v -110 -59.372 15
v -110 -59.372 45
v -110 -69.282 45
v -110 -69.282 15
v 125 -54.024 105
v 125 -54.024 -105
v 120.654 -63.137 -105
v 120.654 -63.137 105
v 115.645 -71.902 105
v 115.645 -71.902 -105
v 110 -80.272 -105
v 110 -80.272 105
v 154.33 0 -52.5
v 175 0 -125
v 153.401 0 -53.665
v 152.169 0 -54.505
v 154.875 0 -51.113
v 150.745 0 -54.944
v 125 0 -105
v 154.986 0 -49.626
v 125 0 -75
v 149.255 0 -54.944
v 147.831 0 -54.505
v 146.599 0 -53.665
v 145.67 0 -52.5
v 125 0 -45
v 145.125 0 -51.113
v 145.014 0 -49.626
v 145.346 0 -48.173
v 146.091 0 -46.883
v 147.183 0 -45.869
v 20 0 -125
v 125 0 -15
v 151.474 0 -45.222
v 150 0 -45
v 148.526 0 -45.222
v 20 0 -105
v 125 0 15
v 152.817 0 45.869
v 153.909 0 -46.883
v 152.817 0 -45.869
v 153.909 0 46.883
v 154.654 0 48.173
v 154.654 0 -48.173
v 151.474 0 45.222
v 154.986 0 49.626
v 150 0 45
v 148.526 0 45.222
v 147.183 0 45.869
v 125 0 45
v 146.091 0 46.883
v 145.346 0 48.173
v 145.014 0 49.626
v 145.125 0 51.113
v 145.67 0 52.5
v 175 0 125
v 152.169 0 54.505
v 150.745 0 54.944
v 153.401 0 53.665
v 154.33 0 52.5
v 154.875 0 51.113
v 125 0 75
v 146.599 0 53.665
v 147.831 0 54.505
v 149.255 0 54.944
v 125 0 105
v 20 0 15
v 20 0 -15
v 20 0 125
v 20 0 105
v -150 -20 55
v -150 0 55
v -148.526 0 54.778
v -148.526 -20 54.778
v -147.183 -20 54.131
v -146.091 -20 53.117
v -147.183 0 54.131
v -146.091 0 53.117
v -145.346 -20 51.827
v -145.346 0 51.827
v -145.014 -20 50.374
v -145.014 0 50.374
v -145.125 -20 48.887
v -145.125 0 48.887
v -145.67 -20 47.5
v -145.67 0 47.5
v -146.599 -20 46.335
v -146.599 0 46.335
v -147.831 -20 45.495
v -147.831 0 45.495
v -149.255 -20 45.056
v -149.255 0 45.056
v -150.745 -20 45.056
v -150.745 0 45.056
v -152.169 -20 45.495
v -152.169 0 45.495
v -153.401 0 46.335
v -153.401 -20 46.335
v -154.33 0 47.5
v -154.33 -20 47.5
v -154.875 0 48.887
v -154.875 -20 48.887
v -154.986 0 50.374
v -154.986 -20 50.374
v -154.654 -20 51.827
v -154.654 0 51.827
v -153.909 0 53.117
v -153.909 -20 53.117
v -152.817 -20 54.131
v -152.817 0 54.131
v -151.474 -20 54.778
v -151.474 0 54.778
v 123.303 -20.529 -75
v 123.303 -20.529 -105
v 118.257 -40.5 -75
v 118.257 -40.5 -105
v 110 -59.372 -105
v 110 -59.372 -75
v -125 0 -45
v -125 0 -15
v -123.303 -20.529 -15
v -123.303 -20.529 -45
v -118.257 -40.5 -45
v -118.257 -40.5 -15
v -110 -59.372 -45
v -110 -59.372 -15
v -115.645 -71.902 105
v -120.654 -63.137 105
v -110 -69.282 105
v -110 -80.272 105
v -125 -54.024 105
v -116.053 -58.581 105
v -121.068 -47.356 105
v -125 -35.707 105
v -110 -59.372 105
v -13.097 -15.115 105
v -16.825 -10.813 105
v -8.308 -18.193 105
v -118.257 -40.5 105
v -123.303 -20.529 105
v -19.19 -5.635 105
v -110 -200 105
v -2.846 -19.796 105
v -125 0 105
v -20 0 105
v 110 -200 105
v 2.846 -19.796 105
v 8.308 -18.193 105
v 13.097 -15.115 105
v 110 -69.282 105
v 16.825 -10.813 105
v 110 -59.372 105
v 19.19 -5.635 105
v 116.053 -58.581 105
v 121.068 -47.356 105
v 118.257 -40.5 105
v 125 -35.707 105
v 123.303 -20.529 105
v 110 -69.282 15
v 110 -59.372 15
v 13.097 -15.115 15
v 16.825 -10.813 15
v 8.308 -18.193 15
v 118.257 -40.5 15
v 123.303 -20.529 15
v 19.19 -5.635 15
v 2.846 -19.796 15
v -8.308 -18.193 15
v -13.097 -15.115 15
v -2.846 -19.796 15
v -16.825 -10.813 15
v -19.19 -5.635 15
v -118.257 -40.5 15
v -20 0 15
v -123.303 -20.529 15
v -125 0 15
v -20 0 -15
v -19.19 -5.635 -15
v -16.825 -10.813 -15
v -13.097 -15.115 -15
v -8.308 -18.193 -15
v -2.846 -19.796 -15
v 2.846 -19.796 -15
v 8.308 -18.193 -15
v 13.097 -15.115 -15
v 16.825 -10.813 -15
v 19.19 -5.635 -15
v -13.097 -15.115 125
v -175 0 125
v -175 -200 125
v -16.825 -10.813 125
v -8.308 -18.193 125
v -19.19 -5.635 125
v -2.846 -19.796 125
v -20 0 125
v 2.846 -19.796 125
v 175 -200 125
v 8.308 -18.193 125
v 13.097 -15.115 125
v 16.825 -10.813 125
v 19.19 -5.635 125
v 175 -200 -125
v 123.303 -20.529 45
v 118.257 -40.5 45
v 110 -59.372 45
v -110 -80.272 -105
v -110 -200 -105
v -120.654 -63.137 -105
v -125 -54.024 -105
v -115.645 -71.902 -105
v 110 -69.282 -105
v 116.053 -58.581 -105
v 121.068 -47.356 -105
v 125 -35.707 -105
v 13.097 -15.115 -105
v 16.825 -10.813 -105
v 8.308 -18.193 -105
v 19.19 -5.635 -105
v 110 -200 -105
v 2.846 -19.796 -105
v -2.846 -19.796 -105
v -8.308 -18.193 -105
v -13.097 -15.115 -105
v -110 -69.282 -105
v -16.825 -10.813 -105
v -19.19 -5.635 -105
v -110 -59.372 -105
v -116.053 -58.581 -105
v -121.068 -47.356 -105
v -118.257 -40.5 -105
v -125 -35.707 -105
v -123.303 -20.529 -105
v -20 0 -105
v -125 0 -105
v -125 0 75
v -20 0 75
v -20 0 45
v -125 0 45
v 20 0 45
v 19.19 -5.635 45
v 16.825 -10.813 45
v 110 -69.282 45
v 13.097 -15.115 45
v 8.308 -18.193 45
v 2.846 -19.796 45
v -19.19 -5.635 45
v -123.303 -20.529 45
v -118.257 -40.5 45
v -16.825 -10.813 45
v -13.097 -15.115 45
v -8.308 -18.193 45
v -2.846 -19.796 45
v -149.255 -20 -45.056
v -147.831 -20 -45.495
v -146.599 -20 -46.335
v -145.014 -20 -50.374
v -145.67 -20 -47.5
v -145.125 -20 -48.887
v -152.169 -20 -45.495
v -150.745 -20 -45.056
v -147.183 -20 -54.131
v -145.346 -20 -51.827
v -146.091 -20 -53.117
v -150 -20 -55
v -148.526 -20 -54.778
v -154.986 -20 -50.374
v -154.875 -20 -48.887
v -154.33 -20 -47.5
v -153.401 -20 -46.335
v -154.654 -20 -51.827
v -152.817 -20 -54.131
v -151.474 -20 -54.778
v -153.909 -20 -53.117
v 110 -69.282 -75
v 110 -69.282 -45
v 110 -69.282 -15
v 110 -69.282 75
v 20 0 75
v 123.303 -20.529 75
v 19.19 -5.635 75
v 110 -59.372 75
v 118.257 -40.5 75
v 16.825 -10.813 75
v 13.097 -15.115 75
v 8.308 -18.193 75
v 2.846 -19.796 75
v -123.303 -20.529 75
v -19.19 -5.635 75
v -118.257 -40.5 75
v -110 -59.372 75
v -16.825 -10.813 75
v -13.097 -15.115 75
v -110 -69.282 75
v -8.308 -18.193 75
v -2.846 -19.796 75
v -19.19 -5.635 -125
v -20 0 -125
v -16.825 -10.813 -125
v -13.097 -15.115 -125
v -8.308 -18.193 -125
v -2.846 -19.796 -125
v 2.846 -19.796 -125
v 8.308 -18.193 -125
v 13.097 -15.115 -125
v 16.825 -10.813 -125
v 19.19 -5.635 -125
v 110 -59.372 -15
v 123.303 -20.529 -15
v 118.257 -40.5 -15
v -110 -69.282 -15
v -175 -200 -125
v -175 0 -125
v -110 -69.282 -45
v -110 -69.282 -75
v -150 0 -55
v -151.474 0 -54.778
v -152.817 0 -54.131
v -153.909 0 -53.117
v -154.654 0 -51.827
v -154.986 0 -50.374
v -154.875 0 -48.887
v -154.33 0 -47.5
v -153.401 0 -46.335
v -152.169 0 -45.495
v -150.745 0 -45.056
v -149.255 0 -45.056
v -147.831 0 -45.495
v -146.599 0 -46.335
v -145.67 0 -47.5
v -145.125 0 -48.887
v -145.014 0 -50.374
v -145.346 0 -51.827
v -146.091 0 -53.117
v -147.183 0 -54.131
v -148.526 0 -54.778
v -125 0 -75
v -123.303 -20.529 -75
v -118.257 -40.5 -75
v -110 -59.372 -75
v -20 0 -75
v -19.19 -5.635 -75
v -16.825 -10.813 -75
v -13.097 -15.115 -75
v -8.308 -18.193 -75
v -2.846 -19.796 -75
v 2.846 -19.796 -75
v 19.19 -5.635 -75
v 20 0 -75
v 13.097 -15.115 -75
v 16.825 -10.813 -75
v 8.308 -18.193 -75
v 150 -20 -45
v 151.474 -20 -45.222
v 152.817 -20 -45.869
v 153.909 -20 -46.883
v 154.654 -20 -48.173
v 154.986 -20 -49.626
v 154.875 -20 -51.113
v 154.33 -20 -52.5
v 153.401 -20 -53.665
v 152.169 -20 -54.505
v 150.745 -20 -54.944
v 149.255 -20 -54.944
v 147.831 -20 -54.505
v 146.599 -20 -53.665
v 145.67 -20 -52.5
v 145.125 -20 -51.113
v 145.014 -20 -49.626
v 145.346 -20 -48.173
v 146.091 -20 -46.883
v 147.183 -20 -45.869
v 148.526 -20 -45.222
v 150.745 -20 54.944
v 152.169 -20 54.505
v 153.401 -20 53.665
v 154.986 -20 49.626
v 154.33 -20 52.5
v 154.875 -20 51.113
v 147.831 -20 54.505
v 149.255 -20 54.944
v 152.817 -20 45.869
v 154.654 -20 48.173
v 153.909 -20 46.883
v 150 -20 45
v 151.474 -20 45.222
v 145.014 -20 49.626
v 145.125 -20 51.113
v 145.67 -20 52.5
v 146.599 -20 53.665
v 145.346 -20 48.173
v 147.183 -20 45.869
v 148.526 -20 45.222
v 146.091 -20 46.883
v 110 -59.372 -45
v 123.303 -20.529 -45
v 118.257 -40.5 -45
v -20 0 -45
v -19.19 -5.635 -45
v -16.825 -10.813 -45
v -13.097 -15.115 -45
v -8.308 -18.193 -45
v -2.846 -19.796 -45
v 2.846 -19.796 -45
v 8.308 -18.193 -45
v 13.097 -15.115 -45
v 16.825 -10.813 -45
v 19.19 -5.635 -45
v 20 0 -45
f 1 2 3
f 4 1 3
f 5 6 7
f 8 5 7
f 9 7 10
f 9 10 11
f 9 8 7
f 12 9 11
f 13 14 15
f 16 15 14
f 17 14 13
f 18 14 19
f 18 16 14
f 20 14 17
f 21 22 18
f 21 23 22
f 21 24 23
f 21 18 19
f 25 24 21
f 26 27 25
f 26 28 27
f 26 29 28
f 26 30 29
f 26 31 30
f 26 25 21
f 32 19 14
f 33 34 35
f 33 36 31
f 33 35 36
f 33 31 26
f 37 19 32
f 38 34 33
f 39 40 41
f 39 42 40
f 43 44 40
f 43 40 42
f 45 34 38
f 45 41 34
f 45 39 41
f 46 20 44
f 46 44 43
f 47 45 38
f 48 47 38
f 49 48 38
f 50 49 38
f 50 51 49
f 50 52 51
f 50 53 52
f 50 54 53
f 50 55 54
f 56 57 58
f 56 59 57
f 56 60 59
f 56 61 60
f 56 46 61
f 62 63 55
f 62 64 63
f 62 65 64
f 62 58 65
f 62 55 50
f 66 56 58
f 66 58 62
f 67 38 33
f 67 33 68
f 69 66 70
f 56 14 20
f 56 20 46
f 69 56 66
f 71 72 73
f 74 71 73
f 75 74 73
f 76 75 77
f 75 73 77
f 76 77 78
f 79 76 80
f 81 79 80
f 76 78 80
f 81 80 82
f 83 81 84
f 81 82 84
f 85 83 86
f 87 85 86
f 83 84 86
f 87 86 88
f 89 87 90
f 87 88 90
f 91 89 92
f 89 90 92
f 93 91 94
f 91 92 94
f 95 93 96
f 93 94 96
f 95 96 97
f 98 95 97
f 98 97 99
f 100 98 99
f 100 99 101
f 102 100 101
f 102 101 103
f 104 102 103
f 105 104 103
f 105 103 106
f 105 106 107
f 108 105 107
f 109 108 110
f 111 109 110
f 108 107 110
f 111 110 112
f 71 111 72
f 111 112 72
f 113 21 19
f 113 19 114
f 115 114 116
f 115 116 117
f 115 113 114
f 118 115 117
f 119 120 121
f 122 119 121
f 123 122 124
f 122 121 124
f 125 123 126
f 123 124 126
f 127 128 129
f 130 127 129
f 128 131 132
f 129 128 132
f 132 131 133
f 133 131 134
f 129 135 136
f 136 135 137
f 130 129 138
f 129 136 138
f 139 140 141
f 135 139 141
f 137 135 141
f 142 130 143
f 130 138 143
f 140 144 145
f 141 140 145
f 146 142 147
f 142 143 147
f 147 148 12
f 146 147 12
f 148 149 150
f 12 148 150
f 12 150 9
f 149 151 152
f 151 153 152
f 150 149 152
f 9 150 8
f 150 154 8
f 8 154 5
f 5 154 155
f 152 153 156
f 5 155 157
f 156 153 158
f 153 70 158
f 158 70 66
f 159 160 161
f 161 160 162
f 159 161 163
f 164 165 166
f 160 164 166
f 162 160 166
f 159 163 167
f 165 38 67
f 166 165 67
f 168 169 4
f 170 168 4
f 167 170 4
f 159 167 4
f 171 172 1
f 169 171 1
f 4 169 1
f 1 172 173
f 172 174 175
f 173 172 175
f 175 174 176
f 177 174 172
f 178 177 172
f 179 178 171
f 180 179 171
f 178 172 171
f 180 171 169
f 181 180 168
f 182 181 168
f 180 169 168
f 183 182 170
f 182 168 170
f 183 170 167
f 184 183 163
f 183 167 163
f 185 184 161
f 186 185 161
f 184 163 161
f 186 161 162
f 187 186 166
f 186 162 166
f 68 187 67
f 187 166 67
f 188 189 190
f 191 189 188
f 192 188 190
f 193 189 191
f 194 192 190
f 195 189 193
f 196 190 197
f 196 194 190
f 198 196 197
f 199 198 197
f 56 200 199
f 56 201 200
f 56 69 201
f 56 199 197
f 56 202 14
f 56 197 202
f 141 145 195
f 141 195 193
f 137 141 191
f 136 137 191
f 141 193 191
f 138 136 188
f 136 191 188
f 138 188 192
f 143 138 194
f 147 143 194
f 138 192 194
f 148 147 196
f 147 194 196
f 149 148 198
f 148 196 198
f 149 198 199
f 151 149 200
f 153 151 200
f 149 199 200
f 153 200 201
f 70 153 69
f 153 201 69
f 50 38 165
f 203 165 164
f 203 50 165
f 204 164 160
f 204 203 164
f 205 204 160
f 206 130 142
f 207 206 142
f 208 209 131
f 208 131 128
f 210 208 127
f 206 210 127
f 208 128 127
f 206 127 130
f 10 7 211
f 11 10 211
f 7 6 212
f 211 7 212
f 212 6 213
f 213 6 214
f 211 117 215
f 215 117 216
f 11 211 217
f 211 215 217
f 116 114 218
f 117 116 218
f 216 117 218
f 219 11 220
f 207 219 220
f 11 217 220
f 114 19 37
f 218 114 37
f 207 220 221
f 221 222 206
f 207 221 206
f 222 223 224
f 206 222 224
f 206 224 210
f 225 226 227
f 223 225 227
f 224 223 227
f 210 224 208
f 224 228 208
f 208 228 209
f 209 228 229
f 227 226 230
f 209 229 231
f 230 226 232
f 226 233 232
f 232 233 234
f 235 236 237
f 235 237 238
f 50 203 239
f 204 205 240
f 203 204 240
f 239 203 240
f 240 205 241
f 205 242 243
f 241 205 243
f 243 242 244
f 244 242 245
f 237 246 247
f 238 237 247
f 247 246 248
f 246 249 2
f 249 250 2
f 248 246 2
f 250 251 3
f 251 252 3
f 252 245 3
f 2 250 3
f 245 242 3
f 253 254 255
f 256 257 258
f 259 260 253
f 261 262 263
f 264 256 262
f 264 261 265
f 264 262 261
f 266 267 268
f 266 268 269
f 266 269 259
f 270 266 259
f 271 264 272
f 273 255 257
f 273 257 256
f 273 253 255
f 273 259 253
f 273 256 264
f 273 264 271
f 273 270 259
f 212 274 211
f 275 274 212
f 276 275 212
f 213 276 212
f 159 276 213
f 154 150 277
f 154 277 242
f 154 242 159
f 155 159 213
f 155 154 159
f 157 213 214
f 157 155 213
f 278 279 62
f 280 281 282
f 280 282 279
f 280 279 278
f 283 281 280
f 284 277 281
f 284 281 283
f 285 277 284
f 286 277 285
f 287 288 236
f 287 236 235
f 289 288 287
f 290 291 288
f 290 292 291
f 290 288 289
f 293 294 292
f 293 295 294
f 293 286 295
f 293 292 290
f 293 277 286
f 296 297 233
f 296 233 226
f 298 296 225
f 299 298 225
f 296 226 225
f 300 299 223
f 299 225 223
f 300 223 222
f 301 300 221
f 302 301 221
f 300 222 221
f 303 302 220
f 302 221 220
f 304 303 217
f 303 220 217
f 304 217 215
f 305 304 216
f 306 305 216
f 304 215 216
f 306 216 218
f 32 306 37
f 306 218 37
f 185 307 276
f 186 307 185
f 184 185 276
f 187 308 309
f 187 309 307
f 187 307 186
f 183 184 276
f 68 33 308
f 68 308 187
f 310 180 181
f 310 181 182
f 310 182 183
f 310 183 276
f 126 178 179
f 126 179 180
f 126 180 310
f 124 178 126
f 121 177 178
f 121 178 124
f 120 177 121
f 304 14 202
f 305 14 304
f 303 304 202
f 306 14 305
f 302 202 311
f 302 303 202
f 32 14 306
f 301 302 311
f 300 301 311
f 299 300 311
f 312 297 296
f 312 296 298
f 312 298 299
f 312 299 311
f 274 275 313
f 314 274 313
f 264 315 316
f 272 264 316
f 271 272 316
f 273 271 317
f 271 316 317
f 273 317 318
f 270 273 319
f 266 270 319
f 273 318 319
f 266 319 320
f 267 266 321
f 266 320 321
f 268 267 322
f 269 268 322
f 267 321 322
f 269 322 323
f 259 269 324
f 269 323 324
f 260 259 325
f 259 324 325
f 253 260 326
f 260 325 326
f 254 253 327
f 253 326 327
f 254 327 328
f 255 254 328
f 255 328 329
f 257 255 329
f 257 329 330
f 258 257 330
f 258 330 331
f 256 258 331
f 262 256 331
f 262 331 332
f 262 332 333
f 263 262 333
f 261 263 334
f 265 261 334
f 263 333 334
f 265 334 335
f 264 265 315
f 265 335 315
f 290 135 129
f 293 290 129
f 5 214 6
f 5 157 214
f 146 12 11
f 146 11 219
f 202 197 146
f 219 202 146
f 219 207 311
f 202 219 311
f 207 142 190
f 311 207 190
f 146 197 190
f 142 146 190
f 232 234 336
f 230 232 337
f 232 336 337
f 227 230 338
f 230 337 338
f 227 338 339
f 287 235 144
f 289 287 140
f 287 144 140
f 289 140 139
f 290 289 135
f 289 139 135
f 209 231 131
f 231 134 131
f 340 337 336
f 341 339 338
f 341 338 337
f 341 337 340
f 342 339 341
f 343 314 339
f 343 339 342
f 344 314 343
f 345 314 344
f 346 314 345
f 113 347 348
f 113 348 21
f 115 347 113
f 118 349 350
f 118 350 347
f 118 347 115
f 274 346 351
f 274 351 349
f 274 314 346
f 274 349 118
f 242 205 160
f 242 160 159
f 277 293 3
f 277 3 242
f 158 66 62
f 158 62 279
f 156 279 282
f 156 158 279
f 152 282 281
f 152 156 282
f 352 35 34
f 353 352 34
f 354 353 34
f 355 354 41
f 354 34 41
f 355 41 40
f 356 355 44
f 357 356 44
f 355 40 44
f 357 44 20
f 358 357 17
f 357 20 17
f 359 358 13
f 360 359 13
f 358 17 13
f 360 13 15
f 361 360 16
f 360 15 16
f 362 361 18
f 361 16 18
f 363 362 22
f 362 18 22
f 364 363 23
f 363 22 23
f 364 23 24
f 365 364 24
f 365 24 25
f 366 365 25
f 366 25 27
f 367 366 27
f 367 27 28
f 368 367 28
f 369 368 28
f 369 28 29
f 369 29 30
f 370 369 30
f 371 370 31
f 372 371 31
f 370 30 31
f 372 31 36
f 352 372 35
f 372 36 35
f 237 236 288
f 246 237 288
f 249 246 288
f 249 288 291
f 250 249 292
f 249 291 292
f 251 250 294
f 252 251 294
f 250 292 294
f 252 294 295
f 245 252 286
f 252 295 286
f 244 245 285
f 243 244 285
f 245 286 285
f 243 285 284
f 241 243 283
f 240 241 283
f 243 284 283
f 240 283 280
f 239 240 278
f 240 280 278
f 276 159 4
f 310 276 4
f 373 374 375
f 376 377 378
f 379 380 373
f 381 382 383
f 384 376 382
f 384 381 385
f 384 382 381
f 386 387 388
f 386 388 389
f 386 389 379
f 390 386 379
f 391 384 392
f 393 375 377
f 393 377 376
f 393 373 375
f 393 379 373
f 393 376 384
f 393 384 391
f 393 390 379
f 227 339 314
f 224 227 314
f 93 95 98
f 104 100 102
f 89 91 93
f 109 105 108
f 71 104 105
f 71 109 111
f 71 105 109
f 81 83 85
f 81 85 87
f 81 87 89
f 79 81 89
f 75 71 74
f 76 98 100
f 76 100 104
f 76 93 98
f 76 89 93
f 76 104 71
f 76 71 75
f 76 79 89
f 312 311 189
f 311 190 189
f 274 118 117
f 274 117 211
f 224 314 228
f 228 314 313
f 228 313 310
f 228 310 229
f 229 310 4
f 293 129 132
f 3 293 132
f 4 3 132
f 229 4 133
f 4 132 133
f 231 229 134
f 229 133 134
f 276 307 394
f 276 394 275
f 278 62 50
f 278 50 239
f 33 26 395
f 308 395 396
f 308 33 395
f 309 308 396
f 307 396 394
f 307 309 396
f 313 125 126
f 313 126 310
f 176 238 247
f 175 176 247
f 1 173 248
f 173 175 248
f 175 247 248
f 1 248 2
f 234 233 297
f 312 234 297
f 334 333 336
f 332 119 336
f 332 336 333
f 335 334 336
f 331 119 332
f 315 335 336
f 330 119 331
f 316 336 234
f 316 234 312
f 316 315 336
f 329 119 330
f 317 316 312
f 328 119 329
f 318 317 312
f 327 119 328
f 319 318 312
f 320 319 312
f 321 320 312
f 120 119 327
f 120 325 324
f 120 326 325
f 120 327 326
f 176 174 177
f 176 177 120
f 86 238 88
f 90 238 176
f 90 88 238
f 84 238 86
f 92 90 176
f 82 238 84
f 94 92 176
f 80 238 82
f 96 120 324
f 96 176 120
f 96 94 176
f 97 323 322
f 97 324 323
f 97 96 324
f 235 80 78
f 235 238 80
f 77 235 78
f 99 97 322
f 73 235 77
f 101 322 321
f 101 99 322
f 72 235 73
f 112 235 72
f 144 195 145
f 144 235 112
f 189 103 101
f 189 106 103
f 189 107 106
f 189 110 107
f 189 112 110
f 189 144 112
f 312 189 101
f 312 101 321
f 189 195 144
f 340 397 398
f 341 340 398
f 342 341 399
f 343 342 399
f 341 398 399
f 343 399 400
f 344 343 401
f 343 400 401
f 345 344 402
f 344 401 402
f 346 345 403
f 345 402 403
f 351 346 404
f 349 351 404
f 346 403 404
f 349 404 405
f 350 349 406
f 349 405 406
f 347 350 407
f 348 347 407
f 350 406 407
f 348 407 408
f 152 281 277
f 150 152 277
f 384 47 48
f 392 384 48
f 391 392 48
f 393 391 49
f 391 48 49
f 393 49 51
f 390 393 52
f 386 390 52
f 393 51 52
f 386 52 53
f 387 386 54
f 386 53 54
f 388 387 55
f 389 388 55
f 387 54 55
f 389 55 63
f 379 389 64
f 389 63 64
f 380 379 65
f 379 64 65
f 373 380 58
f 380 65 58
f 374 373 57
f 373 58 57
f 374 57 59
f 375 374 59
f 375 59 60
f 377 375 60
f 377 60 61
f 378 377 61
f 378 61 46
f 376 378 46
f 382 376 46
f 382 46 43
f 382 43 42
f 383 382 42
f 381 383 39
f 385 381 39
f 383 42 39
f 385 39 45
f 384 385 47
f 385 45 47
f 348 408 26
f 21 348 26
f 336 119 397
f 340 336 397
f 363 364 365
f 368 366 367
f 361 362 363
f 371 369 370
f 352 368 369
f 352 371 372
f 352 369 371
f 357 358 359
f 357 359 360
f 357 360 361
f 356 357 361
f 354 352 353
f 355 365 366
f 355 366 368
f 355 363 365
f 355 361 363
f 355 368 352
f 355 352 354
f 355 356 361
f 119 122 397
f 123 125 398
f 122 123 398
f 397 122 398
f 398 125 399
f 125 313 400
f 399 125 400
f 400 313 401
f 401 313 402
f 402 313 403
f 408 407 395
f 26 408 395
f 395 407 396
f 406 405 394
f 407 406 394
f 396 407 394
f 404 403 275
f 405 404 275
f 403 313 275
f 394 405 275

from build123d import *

# Parameters (mm, degrees)
BOSS_EXTRUDE1_DEPTH   = 105
BOSS_EXTRUDE1_2_DEPTH = 105
BOSS_EXTRUDE6_DEPTH   = 15
BOSS_EXTRUDE9_START   = -30
BOSS_EXTRUDE9_DEPTH   = 30
BOSS_EXTRUDE10_DEPTH  = 30
SKETCH7_W             = 350
SKETCH7_H             = 200
BOSS_EXTRUDE11_DEPTH  = 20
SKETCH8_W             = 350
SKETCH8_H             = 200
BOSS_EXTRUDE12_DEPTH  = 20
SKETCH9_R             = 20
CUT_EXTRUDE1_DEPTH    = 300
SKETCH10_R            = 5
CUT_EXTRUDE2_DEPTH    = 20


with BuildPart() as part:
    # Sketch1 → Boss-Extrude1 (new, symmetric)
    with BuildSketch(Plane.XY):
        with BuildLine():
            Line((125, -35.707142143), (125, -54.024352148))
            ThreePointArc((125, -54.024352148), (118.230654865, -67.565841039), (110, -80.27222823))
            Line((110, -80.27222823), (110, -200))
            Line((110, -200), (125, -200))
            Line((125, -200), (175, -200))
            Line((175, -200), (175, 0))
            Line((175, 0), (125, 0))
            ThreePointArc((125, 0), (121.191996435, -30.618621785), (110, -59.371710435))
            Line((110, -59.371710435), (110, -69.282032303))
            ThreePointArc((110, -69.282032303), (118.693168769, -53.027650218), (125, -35.707142143))
        make_face()
    extrude(amount=BOSS_EXTRUDE1_DEPTH, both=True)



with BuildPart() as body_2:
    # Sketch1 → Boss-Extrude1 2 (new, symmetric)
    with BuildSketch(Plane.XY):
        with BuildLine():
            Line((-110, -200), (-125, -200))
            Line((-125, -200), (-175, -200))
            Line((-175, -200), (-175, 0))
            Line((-175, 0), (-125, 0))
            ThreePointArc((-125, 0), (-121.191996435, -30.618621785), (-110, -59.371710435))
            Line((-110, -59.371710435), (-110, -69.282032303))
            ThreePointArc((-110, -69.282032303), (-118.693168769, -53.027650218), (-125, -35.707142143))
            Line((-125, -35.707142143), (-125, -54.024352148))
            ThreePointArc((-125, -54.024352148), (-118.230654865, -67.565841039), (-110, -80.27222823))
            Line((-110, -80.27222823), (-110, -200))
        make_face()
    extrude(amount=BOSS_EXTRUDE1_2_DEPTH, both=True)


with BuildPart() as part_1:
    add(part.part)

    add(body_2.part)  # Boss-Extrude6 merges body 2
    # Sketch6 → Boss-Extrude6 (add, symmetric)
    with BuildSketch(Plane.XY):
        with BuildLine():
            Line((-110, -69.282032303), (-110, -59.371710435))
            ThreePointArc((-110, -59.371710435), (-121.191996435, -30.618621785), (-125, 0))
            Line((-125, 0), (125, 0))
            ThreePointArc((125, 0), (121.191996435, -30.618621785), (110, -59.371710435))
            Line((110, -59.371710435), (110, -69.282032303))
            Line((110, -69.282032303), (-110, -69.282032303))
        make_face()
    extrude(amount=BOSS_EXTRUDE6_DEPTH, both=True)

    # 3DSketch3 → Boss-Extrude9 (add)
    with BuildSketch(Plane(origin=(-110, -59.371710435, 45), x_dir=(0.9695359714832644, 0.2449489742783234, 0), z_dir=(0, 0, -1)).offset(BOSS_EXTRUDE9_START)):
        with BuildLine():
            Line((0, 0), (-2.427523176, 9.60841354))
            Line((-2.427523176, 9.60841354), (210.87039055, 63.497187881))
            Line((210.87039055, 63.497187881), (213.297913726, 53.888774341))
            ThreePointArc((213.297913726, 53.888774341), (231.191996435, 28.75308865), (242.383992871, 0))
            Line((242.383992871, 0), (0, -61.23724357))
            ThreePointArc((0, -61.23724357), (-3.808003565, -30.618621785), (0, 0))
        make_face()
    extrude(amount=BOSS_EXTRUDE9_DEPTH)

    # 3DSketch4 → Boss-Extrude10 (add)
    with BuildSketch(Plane(origin=(110, -59.371710435, -45), x_dir=(-0.9695359714832668, 0.2449489742783143, 0), z_dir=(0, 0, 1))):
        with BuildLine():
            Line((0, 0), (-2.427523176, 9.60841354))
            Line((-2.427523176, 9.60841354), (210.87039055, 63.497187881))
            Line((210.87039055, 63.497187881), (213.297913726, 53.888774341))
            ThreePointArc((213.297913726, 53.888774341), (231.191996435, 28.75308865), (242.383992871, 0))
            Line((242.383992871, 0), (0, -61.23724357))
            ThreePointArc((0, -61.23724357), (-3.808003565, -30.618621785), (0, 0))
        make_face()
    extrude(amount=-BOSS_EXTRUDE10_DEPTH)

    # Sketch7 → Boss-Extrude11 (add)
    with BuildSketch(Plane.XY.offset(105)):
        with Locations((0, -100)):
            Rectangle(SKETCH7_W, SKETCH7_H)
    extrude(amount=BOSS_EXTRUDE11_DEPTH)

    # Sketch8 → Boss-Extrude12 (add)
    with BuildSketch(Plane(origin=(0, 0, -105), x_dir=(-1, 0, 0), z_dir=(0, 0, -1))):
        with Locations((0, -100)):
            Rectangle(SKETCH8_W, SKETCH8_H)
    extrude(amount=BOSS_EXTRUDE12_DEPTH)

    # Sketch9 → Cut-Extrude1 (cut)
    with BuildSketch(Plane.XY.offset(125)):
        Circle(SKETCH9_R)
    extrude(amount=-CUT_EXTRUDE1_DEPTH, mode=Mode.SUBTRACT)

    # Sketch10 → Cut-Extrude2 (cut)
    with BuildSketch(Plane(origin=(0, 0, 0), x_dir=(1, 0, 0), z_dir=(0, 1, 0))):
        with Locations(Location((150, 50, 0), (0, 0, 270))):
            Circle(SKETCH10_R)
        with Locations(Location((150, -50, 0), (0, 0, 90))):
            Circle(SKETCH10_R)
        with Locations(Location((-150, -50, 0), (0, 0, 270))):
            Circle(SKETCH10_R)
        with Locations(Location((-150, 50, 0), (0, 0, 90))):
            Circle(SKETCH10_R)
    extrude(amount=-CUT_EXTRUDE2_DEPTH, mode=Mode.SUBTRACT)


solid = part_1.part
